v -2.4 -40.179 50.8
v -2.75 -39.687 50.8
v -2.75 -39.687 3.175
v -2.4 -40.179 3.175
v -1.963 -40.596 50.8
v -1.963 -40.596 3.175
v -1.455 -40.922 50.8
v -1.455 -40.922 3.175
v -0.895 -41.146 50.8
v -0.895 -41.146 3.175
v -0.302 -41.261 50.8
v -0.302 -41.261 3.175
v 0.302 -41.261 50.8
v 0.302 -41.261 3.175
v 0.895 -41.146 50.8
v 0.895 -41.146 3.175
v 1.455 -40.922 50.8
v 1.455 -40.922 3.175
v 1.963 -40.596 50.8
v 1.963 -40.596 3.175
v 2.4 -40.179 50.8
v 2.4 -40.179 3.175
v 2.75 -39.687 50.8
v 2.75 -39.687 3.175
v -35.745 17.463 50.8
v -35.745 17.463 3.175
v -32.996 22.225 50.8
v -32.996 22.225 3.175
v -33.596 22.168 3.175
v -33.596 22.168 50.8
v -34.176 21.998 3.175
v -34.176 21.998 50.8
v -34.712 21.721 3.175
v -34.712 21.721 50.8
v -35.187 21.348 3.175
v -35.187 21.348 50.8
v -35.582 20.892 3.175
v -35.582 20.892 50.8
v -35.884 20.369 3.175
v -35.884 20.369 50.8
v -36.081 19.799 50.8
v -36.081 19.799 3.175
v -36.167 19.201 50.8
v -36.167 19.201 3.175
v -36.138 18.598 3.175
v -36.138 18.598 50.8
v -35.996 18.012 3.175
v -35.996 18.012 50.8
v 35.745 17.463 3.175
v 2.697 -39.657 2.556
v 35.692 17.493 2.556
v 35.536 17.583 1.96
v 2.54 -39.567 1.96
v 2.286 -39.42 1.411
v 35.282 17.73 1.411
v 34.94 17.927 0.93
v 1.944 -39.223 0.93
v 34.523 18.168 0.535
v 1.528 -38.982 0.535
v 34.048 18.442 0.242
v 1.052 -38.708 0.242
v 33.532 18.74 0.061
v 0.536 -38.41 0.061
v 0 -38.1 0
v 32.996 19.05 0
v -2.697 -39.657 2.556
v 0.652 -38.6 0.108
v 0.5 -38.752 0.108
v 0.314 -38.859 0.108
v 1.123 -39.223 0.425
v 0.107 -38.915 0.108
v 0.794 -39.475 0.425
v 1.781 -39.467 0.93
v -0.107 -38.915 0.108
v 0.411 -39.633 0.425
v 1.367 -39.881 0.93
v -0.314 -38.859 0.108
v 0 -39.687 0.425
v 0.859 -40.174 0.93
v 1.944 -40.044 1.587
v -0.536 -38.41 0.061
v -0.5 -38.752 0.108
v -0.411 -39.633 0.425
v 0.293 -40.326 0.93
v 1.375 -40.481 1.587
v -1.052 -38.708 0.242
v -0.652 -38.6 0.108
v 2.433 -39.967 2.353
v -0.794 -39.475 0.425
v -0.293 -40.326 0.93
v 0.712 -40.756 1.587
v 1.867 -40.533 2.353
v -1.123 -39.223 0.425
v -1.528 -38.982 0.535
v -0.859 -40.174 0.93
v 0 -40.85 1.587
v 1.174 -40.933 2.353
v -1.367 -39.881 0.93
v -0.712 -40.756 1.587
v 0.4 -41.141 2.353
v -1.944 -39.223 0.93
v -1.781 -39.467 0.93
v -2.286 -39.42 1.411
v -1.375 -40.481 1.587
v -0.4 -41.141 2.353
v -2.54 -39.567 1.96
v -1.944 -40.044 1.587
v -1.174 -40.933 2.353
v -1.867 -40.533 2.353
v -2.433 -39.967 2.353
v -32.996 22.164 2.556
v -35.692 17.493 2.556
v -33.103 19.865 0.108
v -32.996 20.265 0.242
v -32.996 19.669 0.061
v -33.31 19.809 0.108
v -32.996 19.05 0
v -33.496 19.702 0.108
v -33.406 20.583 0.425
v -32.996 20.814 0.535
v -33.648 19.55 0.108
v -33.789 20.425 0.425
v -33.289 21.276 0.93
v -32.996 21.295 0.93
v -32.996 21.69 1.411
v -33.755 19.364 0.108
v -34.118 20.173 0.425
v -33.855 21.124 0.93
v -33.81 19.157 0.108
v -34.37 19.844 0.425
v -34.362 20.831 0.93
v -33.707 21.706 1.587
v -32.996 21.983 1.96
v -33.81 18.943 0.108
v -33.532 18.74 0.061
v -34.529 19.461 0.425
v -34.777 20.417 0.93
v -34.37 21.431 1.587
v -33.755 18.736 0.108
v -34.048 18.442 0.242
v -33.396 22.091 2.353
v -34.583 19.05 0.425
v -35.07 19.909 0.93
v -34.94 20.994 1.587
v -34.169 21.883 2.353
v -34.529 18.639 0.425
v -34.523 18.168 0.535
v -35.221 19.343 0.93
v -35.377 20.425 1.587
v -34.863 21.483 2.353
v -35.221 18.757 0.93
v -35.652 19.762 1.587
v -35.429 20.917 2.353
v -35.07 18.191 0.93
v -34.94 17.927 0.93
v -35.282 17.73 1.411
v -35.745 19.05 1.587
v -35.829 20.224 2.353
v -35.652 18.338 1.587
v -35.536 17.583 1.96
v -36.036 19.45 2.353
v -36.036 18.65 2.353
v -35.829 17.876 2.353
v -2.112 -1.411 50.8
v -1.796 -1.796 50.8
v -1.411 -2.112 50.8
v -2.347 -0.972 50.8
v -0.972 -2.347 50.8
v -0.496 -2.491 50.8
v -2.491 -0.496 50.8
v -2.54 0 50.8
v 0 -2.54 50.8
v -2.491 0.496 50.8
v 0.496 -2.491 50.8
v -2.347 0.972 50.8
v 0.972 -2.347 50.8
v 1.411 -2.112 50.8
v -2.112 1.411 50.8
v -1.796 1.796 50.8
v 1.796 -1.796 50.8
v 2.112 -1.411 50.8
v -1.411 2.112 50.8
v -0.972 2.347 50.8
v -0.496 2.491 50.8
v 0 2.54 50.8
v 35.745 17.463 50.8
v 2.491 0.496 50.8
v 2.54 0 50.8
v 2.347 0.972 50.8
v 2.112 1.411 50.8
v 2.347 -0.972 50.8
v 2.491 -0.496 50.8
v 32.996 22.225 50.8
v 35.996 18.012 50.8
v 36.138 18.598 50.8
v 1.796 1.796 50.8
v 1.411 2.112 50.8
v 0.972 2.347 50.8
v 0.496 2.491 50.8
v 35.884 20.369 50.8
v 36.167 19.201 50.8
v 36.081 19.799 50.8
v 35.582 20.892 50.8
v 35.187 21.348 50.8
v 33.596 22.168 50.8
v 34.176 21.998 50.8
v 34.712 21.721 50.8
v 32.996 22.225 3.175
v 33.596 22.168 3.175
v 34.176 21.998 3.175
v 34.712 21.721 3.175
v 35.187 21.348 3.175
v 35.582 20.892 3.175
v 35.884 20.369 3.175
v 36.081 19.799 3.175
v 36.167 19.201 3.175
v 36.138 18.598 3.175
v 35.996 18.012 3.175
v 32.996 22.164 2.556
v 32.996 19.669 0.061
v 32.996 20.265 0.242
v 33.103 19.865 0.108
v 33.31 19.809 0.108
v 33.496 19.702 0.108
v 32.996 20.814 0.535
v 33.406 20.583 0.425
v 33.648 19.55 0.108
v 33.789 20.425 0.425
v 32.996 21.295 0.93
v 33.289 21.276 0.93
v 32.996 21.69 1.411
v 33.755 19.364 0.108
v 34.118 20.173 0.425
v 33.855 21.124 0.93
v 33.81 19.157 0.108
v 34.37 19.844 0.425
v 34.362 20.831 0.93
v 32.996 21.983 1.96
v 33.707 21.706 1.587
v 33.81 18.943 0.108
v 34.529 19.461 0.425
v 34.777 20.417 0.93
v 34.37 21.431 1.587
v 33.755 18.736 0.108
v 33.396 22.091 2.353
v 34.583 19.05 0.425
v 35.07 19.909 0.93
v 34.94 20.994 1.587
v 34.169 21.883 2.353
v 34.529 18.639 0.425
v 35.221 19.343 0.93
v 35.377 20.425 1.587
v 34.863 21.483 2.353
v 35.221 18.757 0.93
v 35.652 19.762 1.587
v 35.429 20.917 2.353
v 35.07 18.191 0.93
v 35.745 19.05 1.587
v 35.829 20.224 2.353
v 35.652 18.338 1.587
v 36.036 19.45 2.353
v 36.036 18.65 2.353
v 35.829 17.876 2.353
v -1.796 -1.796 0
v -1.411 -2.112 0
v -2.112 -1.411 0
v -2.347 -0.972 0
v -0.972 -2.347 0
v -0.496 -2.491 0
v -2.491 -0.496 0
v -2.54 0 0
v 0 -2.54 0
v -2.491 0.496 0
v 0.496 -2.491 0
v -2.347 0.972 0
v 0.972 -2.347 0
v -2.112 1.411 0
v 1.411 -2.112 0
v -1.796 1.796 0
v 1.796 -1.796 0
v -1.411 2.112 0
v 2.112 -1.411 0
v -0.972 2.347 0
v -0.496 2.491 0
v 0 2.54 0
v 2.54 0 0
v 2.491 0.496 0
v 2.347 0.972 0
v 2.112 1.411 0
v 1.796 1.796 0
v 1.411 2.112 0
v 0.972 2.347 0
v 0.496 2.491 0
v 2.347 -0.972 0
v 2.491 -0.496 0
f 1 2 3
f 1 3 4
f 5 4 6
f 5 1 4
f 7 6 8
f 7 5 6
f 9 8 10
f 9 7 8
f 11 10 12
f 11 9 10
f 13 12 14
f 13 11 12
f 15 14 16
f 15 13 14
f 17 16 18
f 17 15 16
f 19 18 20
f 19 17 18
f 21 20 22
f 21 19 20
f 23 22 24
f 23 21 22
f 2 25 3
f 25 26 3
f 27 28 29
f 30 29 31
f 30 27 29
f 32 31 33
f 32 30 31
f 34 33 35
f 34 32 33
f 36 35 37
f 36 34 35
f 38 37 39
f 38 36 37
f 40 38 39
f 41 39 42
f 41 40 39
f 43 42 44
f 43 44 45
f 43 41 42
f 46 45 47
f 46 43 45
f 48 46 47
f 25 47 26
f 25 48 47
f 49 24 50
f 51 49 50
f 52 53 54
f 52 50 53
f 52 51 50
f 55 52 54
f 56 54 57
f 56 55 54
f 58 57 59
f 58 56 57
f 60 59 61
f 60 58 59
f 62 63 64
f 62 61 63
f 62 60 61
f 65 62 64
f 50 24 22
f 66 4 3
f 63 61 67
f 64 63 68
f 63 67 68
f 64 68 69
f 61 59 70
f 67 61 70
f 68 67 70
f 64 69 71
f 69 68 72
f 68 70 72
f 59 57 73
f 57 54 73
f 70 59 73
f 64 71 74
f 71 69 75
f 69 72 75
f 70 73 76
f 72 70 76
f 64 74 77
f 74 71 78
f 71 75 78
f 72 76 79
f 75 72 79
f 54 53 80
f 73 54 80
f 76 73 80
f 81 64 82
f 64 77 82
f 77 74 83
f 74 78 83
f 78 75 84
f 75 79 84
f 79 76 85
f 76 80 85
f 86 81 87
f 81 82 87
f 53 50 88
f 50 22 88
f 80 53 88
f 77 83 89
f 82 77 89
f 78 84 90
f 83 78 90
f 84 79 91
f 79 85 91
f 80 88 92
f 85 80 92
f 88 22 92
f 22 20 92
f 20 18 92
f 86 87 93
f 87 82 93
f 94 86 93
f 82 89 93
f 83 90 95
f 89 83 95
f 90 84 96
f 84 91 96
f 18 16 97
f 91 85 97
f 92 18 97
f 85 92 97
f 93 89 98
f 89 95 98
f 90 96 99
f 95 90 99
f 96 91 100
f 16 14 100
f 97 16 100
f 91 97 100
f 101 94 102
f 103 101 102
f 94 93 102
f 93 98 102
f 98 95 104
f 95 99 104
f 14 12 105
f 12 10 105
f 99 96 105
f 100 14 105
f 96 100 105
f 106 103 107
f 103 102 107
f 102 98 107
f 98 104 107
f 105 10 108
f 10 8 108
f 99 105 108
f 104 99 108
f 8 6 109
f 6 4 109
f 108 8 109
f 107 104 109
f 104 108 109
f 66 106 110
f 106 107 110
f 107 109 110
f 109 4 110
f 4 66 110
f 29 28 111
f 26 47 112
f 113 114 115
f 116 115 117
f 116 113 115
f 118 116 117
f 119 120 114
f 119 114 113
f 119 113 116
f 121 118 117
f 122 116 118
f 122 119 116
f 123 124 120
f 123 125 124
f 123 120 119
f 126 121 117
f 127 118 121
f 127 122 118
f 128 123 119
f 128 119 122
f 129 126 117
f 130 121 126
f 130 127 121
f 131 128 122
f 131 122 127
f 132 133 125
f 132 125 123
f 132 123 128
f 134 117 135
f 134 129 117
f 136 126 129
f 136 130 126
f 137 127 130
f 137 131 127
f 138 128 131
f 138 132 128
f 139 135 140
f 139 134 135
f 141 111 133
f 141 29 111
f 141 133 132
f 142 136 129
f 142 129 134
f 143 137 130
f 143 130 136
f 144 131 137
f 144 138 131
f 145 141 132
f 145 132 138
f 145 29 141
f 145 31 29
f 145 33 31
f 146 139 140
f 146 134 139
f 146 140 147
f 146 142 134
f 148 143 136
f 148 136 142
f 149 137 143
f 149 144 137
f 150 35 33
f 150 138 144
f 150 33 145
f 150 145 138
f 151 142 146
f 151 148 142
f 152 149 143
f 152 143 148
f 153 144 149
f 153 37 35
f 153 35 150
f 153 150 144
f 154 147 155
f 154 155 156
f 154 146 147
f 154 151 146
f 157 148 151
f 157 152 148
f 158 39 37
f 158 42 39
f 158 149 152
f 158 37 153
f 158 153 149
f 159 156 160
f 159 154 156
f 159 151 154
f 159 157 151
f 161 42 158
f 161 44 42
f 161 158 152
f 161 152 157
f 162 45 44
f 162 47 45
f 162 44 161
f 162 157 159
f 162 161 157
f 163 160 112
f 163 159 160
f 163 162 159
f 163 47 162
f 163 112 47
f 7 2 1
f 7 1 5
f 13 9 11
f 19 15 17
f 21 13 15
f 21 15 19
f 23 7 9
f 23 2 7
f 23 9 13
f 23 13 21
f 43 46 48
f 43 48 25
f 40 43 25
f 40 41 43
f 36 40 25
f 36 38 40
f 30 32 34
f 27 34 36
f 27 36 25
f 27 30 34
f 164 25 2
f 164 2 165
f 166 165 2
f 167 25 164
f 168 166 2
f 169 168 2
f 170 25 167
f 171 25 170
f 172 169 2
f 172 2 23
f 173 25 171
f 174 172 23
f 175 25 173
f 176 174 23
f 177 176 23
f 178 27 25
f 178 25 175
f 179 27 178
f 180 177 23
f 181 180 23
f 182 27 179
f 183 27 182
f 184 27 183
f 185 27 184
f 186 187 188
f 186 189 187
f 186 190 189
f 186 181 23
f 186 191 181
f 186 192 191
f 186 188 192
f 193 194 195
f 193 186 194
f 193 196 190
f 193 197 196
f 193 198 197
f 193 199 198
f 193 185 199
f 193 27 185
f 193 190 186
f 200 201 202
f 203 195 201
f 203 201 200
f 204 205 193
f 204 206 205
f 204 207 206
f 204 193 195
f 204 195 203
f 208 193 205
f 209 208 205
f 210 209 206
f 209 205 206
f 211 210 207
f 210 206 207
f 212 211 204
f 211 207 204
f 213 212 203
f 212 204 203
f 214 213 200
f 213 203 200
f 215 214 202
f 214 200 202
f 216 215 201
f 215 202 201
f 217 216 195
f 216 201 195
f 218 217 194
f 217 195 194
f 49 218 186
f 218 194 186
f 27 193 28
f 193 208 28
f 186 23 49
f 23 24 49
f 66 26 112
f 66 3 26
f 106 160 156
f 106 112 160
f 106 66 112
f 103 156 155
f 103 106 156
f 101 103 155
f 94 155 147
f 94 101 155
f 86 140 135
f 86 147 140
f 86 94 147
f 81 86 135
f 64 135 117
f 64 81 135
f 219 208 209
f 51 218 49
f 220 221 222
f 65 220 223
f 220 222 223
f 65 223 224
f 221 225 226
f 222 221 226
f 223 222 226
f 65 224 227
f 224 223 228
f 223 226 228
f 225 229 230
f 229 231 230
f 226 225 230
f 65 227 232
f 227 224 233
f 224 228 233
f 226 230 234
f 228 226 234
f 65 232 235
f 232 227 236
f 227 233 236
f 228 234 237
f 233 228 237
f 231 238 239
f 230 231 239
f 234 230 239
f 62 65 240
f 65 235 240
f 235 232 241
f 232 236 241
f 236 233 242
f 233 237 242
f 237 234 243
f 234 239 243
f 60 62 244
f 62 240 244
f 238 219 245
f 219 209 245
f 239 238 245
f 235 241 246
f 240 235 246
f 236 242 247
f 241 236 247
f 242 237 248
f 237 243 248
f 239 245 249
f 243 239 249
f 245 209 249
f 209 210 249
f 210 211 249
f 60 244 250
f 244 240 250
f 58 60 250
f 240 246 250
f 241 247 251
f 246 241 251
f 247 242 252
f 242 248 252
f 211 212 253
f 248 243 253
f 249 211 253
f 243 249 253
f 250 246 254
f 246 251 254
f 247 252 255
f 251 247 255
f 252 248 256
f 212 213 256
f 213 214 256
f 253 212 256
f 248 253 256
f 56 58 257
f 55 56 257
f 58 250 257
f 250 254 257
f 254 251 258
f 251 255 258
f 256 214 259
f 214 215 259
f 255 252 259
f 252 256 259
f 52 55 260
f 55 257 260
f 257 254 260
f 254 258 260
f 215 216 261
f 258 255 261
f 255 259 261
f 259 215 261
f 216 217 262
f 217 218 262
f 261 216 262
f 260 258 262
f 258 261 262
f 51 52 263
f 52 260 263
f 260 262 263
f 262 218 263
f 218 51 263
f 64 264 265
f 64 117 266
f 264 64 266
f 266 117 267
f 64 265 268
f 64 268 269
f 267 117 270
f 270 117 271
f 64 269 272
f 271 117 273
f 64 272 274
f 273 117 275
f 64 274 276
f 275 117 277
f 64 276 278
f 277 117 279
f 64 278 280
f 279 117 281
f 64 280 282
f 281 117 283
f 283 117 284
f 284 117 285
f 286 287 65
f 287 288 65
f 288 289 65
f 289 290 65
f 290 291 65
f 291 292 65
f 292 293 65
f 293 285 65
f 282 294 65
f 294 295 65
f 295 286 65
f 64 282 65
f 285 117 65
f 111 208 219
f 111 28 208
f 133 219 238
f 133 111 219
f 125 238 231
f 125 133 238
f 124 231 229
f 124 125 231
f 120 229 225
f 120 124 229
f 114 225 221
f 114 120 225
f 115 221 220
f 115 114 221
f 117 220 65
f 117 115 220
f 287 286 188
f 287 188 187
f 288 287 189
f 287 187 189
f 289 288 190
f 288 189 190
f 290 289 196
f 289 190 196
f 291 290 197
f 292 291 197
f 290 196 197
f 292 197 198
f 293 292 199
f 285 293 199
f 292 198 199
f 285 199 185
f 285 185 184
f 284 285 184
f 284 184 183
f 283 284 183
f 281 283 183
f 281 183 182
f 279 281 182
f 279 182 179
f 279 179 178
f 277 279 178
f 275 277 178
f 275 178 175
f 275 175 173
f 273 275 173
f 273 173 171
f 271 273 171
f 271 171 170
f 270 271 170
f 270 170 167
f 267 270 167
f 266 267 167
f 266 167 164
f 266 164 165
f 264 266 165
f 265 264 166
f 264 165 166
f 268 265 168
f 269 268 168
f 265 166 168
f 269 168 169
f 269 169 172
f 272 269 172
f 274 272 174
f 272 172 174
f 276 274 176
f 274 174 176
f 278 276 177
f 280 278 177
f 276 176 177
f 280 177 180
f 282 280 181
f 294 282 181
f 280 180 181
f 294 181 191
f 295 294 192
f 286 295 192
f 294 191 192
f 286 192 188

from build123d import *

# Parameters (mm, degrees)
F1_DEPTH = 50.8
F2_R     = 3.175
F3_R     = 2.54
F4_DEPTH = 50.801


with BuildPart() as f1:
    # F0 (on Top) → F1 (new body)
    with BuildSketch(Plane.XY):
        Polygon((38.494829, 22.225), (-38.494829, 22.225), (0, -44.45), align=None)
    extrude(amount=F1_DEPTH)

    # F2
    f2_edges = [f1.edges().sort_by_distance(p)[0] for p in [
        (-38.494829, 22.225, 25.4),
        (0, -44.45, 25.4),
        (38.494829, 22.225, 25.4),
        (0, 22.225, 0),
        (19.247415, -11.1125, 0),
        (-19.247415, -11.1125, 0),
    ]]
    fillet(f2_edges, radius=F2_R)

    # F3 (on face) → F4 (cut, through all)
    with BuildSketch(Plane.XY.offset(50.8)):
        Circle(F3_R)
    extrude(amount=-F4_DEPTH, mode=Mode.SUBTRACT)


solid = f1.part
